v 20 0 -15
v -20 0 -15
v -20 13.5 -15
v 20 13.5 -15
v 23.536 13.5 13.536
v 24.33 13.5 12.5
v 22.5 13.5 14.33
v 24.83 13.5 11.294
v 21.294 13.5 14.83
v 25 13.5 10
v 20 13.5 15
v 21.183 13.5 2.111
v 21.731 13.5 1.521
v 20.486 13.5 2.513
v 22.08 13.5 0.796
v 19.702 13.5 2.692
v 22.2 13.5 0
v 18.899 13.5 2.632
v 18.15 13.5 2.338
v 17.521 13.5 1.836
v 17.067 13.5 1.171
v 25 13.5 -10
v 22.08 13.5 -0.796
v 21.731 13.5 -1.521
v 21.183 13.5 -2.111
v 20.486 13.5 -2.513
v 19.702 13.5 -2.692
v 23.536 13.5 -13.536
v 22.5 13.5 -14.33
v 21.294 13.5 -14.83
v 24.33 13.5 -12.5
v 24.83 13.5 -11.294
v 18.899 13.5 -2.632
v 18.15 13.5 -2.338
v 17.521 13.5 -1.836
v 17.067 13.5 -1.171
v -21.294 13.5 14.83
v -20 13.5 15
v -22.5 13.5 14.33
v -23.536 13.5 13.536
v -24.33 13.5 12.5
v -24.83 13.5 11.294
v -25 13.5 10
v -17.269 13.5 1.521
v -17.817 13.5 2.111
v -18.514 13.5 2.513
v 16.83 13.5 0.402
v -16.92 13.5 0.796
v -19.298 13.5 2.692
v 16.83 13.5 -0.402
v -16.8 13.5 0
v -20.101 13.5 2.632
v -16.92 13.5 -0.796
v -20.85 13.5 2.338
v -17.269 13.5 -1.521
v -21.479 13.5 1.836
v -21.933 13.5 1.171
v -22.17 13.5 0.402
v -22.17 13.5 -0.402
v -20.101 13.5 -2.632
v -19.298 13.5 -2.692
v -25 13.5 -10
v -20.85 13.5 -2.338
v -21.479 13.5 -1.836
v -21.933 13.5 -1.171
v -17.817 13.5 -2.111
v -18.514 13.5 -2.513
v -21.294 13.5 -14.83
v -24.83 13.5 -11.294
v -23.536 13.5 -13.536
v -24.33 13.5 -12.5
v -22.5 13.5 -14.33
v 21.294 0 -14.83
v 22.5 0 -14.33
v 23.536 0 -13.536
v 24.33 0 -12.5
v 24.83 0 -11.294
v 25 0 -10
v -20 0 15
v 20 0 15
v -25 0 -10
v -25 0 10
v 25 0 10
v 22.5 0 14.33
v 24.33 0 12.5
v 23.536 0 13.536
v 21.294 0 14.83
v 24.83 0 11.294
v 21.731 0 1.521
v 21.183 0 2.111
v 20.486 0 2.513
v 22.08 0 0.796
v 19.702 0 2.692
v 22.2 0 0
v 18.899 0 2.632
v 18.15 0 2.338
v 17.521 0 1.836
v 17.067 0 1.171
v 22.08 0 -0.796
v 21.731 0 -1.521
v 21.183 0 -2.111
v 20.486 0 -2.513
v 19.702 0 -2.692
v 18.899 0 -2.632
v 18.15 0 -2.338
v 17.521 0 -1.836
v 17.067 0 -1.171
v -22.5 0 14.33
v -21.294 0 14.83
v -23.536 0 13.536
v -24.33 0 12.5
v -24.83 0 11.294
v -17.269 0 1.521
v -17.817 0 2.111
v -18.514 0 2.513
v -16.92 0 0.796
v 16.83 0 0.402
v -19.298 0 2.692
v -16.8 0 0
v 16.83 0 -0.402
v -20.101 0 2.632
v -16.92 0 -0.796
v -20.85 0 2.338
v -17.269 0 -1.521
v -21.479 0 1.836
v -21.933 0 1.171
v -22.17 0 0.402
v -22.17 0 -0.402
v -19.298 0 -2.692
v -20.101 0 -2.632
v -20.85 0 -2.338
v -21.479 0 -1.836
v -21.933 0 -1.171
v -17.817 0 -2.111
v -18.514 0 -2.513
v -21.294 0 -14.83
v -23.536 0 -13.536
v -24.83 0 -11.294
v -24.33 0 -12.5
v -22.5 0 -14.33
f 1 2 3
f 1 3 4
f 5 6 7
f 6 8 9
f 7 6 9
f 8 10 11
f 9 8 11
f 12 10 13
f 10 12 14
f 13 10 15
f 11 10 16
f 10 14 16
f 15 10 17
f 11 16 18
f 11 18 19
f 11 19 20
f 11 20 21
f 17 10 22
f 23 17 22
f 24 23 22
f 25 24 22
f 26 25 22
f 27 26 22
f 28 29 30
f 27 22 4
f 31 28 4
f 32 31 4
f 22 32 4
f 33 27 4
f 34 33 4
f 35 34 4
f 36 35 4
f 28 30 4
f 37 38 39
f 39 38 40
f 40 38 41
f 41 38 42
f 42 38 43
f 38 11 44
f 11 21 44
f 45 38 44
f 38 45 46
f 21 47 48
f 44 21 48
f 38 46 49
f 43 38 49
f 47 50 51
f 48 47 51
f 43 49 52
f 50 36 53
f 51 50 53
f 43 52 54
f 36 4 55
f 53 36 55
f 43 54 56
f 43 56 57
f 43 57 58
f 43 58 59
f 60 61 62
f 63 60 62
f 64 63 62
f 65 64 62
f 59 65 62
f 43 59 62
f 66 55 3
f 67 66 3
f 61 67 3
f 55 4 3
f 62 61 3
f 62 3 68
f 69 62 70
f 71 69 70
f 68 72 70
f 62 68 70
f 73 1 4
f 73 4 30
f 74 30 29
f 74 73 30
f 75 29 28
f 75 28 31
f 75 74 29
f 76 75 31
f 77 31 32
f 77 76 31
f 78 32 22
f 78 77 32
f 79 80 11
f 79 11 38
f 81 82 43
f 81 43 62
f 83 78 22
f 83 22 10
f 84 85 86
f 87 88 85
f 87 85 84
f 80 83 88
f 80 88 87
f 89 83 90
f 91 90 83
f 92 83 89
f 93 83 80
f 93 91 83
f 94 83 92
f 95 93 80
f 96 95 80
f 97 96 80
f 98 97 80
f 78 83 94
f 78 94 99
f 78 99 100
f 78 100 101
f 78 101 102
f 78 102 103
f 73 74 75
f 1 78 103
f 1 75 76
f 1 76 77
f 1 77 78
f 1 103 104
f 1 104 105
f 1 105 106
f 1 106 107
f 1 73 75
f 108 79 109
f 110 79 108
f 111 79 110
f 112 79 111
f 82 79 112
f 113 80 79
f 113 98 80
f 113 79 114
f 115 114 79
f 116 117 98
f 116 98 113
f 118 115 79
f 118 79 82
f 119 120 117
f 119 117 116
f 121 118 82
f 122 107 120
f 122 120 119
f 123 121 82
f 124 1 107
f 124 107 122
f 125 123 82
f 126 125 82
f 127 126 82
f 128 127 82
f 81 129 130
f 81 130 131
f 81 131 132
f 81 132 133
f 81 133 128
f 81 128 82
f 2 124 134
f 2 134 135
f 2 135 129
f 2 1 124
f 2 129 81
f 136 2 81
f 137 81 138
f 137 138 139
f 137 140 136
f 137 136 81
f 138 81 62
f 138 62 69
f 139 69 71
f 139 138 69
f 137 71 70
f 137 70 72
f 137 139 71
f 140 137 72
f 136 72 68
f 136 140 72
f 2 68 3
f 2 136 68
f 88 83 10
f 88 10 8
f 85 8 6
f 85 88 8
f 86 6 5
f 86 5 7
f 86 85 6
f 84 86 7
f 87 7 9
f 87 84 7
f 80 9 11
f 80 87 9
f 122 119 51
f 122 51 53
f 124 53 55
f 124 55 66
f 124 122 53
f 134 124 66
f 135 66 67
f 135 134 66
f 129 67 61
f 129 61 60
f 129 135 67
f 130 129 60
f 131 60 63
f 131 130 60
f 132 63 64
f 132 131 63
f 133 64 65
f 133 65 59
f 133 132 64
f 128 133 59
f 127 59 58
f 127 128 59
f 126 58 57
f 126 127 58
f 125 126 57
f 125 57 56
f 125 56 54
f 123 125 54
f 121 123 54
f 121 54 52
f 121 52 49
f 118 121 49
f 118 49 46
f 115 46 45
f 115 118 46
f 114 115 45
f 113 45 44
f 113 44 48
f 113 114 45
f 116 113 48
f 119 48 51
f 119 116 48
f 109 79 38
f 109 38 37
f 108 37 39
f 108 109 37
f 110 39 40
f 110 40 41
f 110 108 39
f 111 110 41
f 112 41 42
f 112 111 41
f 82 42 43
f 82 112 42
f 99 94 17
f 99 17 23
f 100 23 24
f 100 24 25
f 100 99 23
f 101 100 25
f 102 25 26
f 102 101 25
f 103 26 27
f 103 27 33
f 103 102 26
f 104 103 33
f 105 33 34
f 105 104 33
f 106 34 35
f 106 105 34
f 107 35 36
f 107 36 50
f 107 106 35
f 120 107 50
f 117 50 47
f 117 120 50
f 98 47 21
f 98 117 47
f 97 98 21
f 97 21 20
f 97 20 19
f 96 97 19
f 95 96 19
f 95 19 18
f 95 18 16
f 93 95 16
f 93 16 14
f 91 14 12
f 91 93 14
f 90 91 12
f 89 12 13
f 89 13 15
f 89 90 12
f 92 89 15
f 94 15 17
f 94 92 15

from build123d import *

# Parameters (mm, degrees)
SKETCH1_R           = 2.7
BOSS_EXTRUDE1_DEPTH = 13.5


with BuildPart() as part:
    # Sketch1 → Boss-Extrude1 (new body)
    with BuildSketch(Plane(origin=(0, 0, 0), x_dir=(1, 0, 0), z_dir=(0, 1, 0))):
        with BuildLine():
            Line((20, -15), (-20, -15))
            ThreePointArc((-20, -15), (-23.535533906, -13.535533906), (-25, -10))
            Line((-25, -10), (-25, 10))
            ThreePointArc((-25, 10), (-23.535533906, 13.535533906), (-20, 15))
            Line((-20, 15), (20, 15))
            ThreePointArc((20, 15), (23.535533906, 13.535533906), (25, 10))
            Line((25, 10), (25, -10))
            ThreePointArc((25, -10), (23.535533906, -13.535533906), (20, -15))
        make_face()
        with Locations((-19.5, 0)):
            Circle(SKETCH1_R, mode=Mode.SUBTRACT)
        with Locations((19.5, 0)):
            Circle(SKETCH1_R, mode=Mode.SUBTRACT)
    extrude(amount=BOSS_EXTRUDE1_DEPTH)


solid = part.part
